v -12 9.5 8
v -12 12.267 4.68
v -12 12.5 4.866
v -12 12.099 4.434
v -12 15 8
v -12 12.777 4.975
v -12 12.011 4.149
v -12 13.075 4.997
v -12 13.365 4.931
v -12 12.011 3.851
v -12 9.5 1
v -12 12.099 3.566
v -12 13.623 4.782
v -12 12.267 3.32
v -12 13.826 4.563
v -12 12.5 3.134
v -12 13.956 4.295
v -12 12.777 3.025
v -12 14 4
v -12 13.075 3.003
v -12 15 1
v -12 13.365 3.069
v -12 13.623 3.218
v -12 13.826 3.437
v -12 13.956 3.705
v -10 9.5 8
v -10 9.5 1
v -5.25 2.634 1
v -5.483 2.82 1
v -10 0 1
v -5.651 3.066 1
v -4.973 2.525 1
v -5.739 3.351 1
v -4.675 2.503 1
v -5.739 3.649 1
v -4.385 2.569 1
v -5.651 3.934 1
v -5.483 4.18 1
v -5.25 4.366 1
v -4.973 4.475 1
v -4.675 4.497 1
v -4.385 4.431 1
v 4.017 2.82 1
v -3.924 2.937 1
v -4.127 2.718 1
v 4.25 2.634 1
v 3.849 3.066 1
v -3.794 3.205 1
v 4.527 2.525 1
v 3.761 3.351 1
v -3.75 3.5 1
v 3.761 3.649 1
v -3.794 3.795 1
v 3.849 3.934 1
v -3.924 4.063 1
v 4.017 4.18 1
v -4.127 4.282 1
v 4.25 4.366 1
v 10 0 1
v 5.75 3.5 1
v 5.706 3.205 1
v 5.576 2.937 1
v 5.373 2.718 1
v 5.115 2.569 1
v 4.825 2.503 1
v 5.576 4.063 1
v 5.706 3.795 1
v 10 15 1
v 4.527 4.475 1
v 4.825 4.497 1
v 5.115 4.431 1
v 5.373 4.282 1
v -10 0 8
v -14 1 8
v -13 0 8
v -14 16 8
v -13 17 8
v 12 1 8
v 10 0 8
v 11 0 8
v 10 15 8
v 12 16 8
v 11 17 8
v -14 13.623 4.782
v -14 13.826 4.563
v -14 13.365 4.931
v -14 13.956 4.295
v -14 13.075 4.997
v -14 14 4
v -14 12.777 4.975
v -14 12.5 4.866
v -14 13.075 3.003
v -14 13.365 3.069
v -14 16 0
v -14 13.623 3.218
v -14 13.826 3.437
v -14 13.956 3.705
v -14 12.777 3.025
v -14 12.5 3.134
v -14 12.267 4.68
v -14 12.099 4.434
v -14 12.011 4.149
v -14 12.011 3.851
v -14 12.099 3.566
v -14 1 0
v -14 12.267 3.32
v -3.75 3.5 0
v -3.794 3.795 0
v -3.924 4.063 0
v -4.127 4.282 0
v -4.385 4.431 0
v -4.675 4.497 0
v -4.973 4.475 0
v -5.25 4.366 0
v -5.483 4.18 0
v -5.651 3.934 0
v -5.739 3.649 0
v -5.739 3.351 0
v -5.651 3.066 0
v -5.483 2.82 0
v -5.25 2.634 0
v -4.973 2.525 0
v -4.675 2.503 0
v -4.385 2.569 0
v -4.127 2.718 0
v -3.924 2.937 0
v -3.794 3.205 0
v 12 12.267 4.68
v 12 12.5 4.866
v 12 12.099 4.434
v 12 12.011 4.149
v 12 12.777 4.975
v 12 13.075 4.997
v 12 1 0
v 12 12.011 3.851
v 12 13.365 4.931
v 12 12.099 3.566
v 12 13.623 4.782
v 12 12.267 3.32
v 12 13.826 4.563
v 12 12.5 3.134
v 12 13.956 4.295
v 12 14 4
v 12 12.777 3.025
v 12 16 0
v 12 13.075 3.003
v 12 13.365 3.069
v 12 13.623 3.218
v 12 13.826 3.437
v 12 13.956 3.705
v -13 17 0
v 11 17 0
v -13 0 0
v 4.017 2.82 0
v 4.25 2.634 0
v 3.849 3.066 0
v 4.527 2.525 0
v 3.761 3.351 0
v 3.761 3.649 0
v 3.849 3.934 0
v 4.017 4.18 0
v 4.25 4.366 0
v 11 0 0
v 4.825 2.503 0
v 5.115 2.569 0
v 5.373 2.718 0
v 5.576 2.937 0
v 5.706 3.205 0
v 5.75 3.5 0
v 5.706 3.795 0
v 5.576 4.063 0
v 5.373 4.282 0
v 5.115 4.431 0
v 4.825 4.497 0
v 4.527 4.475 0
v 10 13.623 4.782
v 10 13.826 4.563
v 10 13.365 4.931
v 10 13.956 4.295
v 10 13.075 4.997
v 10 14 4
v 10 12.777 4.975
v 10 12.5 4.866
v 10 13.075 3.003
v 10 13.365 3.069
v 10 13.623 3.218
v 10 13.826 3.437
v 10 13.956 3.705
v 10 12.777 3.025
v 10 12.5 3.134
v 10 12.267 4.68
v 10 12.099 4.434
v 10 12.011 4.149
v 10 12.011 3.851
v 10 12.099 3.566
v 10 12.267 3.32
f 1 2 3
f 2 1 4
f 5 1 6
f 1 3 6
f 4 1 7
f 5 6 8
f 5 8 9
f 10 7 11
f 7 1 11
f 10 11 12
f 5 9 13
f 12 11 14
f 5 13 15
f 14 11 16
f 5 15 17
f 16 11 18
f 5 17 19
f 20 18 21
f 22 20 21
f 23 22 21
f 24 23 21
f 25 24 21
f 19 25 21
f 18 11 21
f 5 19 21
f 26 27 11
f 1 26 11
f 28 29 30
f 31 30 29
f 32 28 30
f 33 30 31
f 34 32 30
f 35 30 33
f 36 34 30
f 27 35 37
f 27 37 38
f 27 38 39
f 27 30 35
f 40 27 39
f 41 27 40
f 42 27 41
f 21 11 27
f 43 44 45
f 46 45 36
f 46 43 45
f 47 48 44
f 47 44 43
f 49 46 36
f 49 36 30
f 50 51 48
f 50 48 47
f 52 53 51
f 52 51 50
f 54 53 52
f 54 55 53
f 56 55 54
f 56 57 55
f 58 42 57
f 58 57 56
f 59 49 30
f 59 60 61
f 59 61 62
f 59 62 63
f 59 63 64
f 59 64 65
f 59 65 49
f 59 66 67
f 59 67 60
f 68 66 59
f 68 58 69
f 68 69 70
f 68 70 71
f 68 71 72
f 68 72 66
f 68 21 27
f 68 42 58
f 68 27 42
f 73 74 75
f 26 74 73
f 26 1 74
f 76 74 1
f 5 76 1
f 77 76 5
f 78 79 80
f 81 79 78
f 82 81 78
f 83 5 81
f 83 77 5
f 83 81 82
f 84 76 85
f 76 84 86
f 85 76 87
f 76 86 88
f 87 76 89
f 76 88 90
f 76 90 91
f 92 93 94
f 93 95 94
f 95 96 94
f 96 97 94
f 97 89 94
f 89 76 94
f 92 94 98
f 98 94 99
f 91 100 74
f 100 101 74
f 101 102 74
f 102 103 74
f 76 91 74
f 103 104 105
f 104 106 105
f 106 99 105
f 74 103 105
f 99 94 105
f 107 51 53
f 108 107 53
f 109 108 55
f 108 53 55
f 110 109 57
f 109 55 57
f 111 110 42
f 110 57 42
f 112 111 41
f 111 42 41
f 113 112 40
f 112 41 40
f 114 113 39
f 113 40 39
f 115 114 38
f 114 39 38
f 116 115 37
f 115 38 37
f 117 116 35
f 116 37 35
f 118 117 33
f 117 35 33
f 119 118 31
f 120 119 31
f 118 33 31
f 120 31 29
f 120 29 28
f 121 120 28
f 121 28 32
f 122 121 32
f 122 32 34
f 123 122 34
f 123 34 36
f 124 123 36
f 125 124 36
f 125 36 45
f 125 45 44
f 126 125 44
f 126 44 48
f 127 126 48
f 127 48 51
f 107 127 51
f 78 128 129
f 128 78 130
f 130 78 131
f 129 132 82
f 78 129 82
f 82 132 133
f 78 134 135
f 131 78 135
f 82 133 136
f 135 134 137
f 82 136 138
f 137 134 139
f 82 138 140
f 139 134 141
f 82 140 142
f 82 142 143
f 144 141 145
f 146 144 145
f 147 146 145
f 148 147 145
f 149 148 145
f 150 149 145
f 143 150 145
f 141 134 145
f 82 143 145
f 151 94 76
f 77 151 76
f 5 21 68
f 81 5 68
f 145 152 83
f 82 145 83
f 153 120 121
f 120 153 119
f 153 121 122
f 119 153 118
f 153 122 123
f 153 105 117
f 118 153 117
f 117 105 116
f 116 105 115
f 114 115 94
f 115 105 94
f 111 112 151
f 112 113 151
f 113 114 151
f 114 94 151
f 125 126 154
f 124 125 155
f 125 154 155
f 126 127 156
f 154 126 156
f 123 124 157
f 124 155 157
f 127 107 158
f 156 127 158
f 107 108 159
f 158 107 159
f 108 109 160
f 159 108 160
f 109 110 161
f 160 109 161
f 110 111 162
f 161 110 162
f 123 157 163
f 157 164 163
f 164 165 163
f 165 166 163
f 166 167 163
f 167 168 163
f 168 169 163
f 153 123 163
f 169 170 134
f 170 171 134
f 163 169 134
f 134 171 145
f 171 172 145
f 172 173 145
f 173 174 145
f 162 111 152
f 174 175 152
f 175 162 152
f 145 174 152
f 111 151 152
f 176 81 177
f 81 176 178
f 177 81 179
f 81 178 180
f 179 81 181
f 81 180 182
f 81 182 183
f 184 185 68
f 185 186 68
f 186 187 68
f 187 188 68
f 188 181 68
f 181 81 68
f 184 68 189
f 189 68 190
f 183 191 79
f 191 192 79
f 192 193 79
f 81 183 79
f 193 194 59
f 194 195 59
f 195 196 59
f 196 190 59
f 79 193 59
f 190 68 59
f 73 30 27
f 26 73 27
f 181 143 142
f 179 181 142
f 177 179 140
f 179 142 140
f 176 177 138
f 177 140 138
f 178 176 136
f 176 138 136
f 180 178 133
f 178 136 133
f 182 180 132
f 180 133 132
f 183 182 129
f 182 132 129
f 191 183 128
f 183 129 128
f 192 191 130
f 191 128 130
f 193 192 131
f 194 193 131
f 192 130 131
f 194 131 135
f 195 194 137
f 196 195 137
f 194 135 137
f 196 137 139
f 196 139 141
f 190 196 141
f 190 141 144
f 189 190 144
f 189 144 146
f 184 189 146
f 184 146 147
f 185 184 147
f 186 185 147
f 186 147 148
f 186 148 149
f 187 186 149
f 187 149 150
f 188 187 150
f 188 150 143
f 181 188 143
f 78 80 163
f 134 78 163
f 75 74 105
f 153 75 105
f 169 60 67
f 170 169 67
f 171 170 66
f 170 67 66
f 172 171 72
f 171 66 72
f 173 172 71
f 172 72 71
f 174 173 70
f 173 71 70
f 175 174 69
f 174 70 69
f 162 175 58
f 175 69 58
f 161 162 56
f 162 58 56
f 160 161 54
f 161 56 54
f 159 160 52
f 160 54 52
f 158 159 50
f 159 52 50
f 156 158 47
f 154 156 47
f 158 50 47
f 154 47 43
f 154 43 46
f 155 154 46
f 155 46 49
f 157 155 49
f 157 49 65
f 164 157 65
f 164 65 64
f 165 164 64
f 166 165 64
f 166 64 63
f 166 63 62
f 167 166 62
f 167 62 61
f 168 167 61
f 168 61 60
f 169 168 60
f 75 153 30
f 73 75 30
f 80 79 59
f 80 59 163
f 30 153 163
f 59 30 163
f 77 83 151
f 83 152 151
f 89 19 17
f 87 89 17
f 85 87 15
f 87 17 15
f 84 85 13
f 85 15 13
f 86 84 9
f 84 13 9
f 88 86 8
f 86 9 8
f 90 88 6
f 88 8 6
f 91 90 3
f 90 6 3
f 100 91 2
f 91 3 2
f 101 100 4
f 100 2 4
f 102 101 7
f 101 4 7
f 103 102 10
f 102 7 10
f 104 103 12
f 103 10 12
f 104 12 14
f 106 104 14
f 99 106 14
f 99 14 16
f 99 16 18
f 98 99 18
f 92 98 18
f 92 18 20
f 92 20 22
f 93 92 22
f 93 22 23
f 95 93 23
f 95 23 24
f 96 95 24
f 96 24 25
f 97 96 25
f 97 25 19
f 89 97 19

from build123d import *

# Parameters (mm, degrees)
F0_R     = 1
F1_DEPTH = 1
F2_DEPTH = 8
F3_DEPTH = 10
F4_R     = 1
F5_DEPTH = 30
F6_SIZE  = 1


with BuildPart() as f1:
    # F0 (on Top) → F1 (new body)
    with BuildSketch(Plane.XY):
        Polygon((-10, 9.5), (-10, 0), (10, 0), (10, 9.5), (10, 15), (-12, 15), (-12, 9.5), align=None)
        with Locations((-4.75, 3.5)):
            Circle(F0_R, mode=Mode.SUBTRACT)
        with Locations((4.75, 3.5)):
            Circle(F0_R, mode=Mode.SUBTRACT)
        with Locations((-4.75, 3.5)):
            Circle(F0_R)
        with Locations((4.75, 3.5)):
            Circle(F0_R)
        Polygon((-14, 0), (-10, 0), (-10, 9.5), (-12, 9.5), (-12, 15), (10, 15), (10, 9.5), (10, 0), (12, 0), (12, 17), (-14, 17), align=None)
    extrude(amount=F1_DEPTH)

    # F0 (on Top) → F2 (join)
    with BuildSketch(Plane.XY):
        Polygon((-14, 0), (-10, 0), (-10, 9.5), (-12, 9.5), (-12, 15), (10, 15), (10, 9.5), (10, 0), (12, 0), (12, 17), (-14, 17), align=None)
        with Locations((-4.75, 3.5)):
            Circle(F0_R)
        with Locations((4.75, 3.5)):
            Circle(F0_R)
    extrude(amount=F2_DEPTH)

    # F3 (cut): faces of the model
    f3_faces = [f1.faces().sort_by_distance(p)[0] for p in [
        (-4.75, 3.5, 8),
        (4.75, 3.5, 8),
    ]]
    extrude(f3_faces, amount=-F3_DEPTH, mode=Mode.SUBTRACT)

    # F4 (on face) → F5 (cut)
    with BuildSketch(Plane.YZ.offset(12)):
        with Locations((13, 4)):
            Circle(F4_R)
    extrude(amount=-F5_DEPTH, mode=Mode.SUBTRACT)

    # F6
    f6_edges = [f1.edges().sort_by_distance(p)[0] for p in [
        (-14, 17, 4),
        (12, 17, 4),
        (-14, 0, 4),
        (12, 0, 4),
    ]]
    chamfer(f6_edges, length=F6_SIZE)


solid = f1.part
